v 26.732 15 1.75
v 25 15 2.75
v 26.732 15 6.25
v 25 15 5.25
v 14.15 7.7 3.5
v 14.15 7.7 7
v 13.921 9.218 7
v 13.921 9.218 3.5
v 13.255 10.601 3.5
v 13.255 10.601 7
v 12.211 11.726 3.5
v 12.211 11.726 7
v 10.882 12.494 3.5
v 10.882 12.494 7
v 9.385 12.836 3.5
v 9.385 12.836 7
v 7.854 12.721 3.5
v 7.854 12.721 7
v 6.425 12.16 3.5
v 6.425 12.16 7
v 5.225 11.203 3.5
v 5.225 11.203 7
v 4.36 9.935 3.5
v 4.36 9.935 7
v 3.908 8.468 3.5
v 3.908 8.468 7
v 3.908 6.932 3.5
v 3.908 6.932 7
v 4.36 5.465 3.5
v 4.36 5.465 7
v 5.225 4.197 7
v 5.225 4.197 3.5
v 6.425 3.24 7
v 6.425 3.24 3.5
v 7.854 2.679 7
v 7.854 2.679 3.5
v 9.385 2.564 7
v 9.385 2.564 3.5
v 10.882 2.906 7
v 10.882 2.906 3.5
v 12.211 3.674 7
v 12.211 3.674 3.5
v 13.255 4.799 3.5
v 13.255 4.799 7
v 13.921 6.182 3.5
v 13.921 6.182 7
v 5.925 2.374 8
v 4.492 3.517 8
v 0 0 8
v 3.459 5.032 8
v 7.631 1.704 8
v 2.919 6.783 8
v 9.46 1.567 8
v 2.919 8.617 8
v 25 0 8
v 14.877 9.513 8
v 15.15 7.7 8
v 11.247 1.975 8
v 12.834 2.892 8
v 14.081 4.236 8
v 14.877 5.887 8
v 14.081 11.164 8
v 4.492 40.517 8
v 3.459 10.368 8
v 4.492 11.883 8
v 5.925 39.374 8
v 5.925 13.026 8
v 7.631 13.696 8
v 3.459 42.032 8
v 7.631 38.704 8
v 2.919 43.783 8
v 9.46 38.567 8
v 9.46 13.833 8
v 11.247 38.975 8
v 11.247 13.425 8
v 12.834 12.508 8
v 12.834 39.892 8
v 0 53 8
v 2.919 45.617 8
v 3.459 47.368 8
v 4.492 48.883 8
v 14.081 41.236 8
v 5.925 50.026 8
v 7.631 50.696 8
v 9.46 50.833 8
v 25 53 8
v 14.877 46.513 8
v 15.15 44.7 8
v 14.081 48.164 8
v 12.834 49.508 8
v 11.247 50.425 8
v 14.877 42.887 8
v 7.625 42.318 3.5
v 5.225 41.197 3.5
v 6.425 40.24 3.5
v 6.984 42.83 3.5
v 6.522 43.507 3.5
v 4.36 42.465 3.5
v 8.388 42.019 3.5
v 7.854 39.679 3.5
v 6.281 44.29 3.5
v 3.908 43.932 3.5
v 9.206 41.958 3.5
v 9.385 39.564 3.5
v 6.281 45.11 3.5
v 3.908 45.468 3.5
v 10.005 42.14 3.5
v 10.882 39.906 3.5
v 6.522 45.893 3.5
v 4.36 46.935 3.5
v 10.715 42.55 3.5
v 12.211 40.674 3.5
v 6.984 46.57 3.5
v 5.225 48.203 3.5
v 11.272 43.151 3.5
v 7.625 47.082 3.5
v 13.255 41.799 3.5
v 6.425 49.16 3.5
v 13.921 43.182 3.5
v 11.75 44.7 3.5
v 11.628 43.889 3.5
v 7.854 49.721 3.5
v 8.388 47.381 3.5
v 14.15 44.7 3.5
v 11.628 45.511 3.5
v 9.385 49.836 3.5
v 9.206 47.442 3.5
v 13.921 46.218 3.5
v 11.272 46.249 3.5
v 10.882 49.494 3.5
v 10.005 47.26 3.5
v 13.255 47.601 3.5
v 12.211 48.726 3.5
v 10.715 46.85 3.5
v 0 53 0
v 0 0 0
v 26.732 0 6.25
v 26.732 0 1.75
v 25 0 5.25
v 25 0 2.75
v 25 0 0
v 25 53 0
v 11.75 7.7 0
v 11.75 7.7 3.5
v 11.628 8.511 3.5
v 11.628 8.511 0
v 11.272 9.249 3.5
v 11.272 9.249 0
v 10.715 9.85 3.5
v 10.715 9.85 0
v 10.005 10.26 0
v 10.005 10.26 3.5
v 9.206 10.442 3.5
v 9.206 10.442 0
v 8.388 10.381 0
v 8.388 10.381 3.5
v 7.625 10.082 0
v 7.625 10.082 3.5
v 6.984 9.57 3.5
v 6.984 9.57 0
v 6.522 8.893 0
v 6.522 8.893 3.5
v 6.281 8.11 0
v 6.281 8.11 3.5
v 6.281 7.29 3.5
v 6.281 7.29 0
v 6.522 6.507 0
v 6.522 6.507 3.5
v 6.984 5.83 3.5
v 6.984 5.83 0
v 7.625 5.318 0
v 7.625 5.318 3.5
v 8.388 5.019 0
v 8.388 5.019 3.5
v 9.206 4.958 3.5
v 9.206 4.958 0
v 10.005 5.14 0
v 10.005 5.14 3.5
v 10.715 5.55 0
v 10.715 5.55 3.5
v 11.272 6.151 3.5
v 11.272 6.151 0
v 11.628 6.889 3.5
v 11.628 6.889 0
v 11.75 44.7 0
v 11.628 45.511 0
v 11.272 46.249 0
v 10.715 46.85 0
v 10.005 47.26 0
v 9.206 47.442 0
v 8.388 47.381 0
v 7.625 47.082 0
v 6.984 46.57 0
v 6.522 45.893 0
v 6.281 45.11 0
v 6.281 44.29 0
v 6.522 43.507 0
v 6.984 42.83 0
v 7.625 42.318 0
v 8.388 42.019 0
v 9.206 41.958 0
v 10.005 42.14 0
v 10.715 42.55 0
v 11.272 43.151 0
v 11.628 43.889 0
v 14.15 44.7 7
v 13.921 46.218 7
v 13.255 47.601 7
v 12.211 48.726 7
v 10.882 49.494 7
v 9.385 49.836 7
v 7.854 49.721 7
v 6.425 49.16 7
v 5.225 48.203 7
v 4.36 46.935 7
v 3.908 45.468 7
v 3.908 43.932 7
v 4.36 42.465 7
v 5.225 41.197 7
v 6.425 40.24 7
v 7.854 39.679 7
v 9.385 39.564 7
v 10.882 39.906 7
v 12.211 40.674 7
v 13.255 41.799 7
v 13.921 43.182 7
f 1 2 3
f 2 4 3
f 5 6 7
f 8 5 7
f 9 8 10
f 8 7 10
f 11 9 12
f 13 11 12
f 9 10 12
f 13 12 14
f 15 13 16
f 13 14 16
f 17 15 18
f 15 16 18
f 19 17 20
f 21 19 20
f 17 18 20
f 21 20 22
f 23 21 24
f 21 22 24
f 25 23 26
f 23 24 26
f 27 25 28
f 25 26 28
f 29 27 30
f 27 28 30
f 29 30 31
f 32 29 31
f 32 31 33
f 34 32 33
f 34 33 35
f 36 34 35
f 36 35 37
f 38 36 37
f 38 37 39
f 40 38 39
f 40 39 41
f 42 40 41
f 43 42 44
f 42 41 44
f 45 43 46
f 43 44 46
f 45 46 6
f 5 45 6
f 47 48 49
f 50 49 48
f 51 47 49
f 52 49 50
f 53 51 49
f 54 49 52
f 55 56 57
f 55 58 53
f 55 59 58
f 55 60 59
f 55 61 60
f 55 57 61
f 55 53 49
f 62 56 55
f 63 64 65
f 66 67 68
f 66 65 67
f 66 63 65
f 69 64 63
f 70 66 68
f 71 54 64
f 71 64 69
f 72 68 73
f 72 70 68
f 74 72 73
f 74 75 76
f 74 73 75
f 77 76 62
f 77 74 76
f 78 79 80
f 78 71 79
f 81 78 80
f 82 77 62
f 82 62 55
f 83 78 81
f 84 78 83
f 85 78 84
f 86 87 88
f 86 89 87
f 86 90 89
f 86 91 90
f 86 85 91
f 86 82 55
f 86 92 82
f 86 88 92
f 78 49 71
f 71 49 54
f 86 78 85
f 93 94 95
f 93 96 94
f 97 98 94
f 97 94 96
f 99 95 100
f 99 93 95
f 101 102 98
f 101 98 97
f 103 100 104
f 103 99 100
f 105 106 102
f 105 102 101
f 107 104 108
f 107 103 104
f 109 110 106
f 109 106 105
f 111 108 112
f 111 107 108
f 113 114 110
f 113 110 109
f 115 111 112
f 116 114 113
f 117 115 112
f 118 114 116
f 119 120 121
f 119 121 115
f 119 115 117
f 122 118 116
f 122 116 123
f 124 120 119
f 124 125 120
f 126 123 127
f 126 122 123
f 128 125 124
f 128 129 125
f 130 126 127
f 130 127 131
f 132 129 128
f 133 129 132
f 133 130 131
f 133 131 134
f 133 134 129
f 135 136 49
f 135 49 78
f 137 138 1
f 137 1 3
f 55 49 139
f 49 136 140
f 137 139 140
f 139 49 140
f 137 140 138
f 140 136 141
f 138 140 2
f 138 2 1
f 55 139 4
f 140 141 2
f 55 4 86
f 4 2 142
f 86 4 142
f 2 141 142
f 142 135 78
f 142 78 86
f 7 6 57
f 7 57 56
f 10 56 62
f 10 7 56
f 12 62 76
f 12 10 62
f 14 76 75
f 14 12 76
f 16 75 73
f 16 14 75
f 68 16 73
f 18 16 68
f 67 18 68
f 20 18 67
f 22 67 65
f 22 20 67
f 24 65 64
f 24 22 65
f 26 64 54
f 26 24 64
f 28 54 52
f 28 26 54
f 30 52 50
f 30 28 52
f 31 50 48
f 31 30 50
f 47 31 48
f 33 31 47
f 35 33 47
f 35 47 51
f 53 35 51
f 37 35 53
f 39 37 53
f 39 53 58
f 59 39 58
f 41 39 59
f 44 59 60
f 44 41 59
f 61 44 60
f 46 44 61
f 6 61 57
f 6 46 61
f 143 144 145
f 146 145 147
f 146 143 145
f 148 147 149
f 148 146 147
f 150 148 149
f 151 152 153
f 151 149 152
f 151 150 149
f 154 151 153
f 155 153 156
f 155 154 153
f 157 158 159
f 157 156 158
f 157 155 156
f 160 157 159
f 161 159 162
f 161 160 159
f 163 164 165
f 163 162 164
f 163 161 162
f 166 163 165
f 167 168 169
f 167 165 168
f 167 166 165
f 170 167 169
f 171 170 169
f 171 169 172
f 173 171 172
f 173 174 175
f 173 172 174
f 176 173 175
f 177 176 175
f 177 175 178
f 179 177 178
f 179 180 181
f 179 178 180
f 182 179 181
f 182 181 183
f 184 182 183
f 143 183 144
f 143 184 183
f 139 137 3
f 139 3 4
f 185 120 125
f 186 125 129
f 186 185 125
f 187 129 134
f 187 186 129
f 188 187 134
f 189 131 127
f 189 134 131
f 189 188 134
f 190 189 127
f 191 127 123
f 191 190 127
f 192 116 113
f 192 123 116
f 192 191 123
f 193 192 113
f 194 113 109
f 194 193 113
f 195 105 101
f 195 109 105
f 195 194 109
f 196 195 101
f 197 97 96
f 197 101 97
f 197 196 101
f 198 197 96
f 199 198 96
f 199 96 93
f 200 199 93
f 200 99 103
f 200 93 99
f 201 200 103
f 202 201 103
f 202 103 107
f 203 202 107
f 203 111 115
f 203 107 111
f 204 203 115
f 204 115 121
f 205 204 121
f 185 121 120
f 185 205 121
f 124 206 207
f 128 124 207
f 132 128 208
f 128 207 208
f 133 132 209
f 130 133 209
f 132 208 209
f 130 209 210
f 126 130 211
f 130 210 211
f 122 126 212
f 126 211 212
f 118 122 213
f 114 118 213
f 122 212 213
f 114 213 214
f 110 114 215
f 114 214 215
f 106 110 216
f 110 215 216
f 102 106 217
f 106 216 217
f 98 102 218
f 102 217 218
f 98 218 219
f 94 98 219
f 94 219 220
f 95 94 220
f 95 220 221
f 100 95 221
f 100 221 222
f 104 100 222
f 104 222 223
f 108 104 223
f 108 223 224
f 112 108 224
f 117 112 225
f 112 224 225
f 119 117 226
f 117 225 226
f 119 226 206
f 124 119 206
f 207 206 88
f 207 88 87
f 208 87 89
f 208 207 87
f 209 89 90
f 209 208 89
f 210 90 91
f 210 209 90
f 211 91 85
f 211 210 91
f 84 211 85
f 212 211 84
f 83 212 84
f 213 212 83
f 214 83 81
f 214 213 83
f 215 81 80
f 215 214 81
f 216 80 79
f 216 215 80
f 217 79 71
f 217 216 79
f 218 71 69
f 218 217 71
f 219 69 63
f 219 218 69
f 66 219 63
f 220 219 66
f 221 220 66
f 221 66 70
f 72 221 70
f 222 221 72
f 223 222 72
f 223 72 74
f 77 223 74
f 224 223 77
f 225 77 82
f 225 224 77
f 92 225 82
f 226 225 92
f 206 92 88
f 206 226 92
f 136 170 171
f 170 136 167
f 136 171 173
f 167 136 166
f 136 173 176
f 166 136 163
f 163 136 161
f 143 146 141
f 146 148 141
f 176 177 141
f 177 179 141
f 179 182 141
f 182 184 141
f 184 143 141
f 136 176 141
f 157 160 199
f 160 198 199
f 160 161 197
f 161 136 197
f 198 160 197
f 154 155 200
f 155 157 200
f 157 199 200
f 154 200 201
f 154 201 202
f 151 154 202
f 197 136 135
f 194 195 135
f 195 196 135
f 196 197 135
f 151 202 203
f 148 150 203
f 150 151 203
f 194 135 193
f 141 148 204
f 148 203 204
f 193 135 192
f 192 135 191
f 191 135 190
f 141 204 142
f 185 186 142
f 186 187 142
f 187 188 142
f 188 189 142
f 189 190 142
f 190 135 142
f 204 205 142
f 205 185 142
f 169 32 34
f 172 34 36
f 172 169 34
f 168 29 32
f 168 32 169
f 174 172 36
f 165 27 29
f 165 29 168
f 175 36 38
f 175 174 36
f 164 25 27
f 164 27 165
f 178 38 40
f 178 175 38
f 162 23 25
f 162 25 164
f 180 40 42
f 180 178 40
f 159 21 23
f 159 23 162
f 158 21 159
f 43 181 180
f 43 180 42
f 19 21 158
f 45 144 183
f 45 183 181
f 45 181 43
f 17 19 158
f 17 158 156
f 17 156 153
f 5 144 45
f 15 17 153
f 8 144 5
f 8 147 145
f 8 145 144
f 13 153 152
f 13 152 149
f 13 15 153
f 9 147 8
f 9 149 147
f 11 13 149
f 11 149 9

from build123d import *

# Parameters (mm, degrees)
SKETCH2_W           = 25
SKETCH2_H           = 53
SKETCH2_R           = 2.75
BOSS_EXTRUDE1_DEPTH = 8
BOSS_EXTRUDE2_DEPTH = 15
SKETCH4_R           = 5.15
CUT_EXTRUDE1_DEPTH  = 4.5
CHAMFER1_SIZE       = 1


with BuildPart() as part:
    # Sketch2 → Boss-Extrude1 (new body)
    with BuildSketch(Plane.XY):
        with Locations((12.5, 26.5)):
            Rectangle(SKETCH2_W, SKETCH2_H)
        with Locations((9, 44.7)):
            Circle(SKETCH2_R, mode=Mode.SUBTRACT)
        with Locations((9, 7.7)):
            Circle(SKETCH2_R, mode=Mode.SUBTRACT)
    extrude(amount=BOSS_EXTRUDE1_DEPTH)

    # Sketch3 → Boss-Extrude2 (add)
    with BuildSketch(Plane.XZ):
        Polygon((25, 2.75), (26.732050808, 1.75), (26.732050808, 6.25), (25, 5.25), align=None)
    extrude(amount=-BOSS_EXTRUDE2_DEPTH)

    # Sketch4 → Cut-Extrude1 (cut)
    with BuildSketch(Plane.XY.offset(8)):
        with Locations((9, 44.7)):
            Circle(SKETCH4_R)
        with Locations((9, 7.7)):
            Circle(SKETCH4_R)
    extrude(amount=-CUT_EXTRUDE1_DEPTH, mode=Mode.SUBTRACT)

    # Chamfer1
    chamfer1_edges = [part.edges().sort_by_distance(p)[0] for p in [
        (3.85, 44.7, 8),
        (3.85, 7.7, 8),
    ]]
    chamfer(chamfer1_edges, length=CHAMFER1_SIZE)


solid = part.part
